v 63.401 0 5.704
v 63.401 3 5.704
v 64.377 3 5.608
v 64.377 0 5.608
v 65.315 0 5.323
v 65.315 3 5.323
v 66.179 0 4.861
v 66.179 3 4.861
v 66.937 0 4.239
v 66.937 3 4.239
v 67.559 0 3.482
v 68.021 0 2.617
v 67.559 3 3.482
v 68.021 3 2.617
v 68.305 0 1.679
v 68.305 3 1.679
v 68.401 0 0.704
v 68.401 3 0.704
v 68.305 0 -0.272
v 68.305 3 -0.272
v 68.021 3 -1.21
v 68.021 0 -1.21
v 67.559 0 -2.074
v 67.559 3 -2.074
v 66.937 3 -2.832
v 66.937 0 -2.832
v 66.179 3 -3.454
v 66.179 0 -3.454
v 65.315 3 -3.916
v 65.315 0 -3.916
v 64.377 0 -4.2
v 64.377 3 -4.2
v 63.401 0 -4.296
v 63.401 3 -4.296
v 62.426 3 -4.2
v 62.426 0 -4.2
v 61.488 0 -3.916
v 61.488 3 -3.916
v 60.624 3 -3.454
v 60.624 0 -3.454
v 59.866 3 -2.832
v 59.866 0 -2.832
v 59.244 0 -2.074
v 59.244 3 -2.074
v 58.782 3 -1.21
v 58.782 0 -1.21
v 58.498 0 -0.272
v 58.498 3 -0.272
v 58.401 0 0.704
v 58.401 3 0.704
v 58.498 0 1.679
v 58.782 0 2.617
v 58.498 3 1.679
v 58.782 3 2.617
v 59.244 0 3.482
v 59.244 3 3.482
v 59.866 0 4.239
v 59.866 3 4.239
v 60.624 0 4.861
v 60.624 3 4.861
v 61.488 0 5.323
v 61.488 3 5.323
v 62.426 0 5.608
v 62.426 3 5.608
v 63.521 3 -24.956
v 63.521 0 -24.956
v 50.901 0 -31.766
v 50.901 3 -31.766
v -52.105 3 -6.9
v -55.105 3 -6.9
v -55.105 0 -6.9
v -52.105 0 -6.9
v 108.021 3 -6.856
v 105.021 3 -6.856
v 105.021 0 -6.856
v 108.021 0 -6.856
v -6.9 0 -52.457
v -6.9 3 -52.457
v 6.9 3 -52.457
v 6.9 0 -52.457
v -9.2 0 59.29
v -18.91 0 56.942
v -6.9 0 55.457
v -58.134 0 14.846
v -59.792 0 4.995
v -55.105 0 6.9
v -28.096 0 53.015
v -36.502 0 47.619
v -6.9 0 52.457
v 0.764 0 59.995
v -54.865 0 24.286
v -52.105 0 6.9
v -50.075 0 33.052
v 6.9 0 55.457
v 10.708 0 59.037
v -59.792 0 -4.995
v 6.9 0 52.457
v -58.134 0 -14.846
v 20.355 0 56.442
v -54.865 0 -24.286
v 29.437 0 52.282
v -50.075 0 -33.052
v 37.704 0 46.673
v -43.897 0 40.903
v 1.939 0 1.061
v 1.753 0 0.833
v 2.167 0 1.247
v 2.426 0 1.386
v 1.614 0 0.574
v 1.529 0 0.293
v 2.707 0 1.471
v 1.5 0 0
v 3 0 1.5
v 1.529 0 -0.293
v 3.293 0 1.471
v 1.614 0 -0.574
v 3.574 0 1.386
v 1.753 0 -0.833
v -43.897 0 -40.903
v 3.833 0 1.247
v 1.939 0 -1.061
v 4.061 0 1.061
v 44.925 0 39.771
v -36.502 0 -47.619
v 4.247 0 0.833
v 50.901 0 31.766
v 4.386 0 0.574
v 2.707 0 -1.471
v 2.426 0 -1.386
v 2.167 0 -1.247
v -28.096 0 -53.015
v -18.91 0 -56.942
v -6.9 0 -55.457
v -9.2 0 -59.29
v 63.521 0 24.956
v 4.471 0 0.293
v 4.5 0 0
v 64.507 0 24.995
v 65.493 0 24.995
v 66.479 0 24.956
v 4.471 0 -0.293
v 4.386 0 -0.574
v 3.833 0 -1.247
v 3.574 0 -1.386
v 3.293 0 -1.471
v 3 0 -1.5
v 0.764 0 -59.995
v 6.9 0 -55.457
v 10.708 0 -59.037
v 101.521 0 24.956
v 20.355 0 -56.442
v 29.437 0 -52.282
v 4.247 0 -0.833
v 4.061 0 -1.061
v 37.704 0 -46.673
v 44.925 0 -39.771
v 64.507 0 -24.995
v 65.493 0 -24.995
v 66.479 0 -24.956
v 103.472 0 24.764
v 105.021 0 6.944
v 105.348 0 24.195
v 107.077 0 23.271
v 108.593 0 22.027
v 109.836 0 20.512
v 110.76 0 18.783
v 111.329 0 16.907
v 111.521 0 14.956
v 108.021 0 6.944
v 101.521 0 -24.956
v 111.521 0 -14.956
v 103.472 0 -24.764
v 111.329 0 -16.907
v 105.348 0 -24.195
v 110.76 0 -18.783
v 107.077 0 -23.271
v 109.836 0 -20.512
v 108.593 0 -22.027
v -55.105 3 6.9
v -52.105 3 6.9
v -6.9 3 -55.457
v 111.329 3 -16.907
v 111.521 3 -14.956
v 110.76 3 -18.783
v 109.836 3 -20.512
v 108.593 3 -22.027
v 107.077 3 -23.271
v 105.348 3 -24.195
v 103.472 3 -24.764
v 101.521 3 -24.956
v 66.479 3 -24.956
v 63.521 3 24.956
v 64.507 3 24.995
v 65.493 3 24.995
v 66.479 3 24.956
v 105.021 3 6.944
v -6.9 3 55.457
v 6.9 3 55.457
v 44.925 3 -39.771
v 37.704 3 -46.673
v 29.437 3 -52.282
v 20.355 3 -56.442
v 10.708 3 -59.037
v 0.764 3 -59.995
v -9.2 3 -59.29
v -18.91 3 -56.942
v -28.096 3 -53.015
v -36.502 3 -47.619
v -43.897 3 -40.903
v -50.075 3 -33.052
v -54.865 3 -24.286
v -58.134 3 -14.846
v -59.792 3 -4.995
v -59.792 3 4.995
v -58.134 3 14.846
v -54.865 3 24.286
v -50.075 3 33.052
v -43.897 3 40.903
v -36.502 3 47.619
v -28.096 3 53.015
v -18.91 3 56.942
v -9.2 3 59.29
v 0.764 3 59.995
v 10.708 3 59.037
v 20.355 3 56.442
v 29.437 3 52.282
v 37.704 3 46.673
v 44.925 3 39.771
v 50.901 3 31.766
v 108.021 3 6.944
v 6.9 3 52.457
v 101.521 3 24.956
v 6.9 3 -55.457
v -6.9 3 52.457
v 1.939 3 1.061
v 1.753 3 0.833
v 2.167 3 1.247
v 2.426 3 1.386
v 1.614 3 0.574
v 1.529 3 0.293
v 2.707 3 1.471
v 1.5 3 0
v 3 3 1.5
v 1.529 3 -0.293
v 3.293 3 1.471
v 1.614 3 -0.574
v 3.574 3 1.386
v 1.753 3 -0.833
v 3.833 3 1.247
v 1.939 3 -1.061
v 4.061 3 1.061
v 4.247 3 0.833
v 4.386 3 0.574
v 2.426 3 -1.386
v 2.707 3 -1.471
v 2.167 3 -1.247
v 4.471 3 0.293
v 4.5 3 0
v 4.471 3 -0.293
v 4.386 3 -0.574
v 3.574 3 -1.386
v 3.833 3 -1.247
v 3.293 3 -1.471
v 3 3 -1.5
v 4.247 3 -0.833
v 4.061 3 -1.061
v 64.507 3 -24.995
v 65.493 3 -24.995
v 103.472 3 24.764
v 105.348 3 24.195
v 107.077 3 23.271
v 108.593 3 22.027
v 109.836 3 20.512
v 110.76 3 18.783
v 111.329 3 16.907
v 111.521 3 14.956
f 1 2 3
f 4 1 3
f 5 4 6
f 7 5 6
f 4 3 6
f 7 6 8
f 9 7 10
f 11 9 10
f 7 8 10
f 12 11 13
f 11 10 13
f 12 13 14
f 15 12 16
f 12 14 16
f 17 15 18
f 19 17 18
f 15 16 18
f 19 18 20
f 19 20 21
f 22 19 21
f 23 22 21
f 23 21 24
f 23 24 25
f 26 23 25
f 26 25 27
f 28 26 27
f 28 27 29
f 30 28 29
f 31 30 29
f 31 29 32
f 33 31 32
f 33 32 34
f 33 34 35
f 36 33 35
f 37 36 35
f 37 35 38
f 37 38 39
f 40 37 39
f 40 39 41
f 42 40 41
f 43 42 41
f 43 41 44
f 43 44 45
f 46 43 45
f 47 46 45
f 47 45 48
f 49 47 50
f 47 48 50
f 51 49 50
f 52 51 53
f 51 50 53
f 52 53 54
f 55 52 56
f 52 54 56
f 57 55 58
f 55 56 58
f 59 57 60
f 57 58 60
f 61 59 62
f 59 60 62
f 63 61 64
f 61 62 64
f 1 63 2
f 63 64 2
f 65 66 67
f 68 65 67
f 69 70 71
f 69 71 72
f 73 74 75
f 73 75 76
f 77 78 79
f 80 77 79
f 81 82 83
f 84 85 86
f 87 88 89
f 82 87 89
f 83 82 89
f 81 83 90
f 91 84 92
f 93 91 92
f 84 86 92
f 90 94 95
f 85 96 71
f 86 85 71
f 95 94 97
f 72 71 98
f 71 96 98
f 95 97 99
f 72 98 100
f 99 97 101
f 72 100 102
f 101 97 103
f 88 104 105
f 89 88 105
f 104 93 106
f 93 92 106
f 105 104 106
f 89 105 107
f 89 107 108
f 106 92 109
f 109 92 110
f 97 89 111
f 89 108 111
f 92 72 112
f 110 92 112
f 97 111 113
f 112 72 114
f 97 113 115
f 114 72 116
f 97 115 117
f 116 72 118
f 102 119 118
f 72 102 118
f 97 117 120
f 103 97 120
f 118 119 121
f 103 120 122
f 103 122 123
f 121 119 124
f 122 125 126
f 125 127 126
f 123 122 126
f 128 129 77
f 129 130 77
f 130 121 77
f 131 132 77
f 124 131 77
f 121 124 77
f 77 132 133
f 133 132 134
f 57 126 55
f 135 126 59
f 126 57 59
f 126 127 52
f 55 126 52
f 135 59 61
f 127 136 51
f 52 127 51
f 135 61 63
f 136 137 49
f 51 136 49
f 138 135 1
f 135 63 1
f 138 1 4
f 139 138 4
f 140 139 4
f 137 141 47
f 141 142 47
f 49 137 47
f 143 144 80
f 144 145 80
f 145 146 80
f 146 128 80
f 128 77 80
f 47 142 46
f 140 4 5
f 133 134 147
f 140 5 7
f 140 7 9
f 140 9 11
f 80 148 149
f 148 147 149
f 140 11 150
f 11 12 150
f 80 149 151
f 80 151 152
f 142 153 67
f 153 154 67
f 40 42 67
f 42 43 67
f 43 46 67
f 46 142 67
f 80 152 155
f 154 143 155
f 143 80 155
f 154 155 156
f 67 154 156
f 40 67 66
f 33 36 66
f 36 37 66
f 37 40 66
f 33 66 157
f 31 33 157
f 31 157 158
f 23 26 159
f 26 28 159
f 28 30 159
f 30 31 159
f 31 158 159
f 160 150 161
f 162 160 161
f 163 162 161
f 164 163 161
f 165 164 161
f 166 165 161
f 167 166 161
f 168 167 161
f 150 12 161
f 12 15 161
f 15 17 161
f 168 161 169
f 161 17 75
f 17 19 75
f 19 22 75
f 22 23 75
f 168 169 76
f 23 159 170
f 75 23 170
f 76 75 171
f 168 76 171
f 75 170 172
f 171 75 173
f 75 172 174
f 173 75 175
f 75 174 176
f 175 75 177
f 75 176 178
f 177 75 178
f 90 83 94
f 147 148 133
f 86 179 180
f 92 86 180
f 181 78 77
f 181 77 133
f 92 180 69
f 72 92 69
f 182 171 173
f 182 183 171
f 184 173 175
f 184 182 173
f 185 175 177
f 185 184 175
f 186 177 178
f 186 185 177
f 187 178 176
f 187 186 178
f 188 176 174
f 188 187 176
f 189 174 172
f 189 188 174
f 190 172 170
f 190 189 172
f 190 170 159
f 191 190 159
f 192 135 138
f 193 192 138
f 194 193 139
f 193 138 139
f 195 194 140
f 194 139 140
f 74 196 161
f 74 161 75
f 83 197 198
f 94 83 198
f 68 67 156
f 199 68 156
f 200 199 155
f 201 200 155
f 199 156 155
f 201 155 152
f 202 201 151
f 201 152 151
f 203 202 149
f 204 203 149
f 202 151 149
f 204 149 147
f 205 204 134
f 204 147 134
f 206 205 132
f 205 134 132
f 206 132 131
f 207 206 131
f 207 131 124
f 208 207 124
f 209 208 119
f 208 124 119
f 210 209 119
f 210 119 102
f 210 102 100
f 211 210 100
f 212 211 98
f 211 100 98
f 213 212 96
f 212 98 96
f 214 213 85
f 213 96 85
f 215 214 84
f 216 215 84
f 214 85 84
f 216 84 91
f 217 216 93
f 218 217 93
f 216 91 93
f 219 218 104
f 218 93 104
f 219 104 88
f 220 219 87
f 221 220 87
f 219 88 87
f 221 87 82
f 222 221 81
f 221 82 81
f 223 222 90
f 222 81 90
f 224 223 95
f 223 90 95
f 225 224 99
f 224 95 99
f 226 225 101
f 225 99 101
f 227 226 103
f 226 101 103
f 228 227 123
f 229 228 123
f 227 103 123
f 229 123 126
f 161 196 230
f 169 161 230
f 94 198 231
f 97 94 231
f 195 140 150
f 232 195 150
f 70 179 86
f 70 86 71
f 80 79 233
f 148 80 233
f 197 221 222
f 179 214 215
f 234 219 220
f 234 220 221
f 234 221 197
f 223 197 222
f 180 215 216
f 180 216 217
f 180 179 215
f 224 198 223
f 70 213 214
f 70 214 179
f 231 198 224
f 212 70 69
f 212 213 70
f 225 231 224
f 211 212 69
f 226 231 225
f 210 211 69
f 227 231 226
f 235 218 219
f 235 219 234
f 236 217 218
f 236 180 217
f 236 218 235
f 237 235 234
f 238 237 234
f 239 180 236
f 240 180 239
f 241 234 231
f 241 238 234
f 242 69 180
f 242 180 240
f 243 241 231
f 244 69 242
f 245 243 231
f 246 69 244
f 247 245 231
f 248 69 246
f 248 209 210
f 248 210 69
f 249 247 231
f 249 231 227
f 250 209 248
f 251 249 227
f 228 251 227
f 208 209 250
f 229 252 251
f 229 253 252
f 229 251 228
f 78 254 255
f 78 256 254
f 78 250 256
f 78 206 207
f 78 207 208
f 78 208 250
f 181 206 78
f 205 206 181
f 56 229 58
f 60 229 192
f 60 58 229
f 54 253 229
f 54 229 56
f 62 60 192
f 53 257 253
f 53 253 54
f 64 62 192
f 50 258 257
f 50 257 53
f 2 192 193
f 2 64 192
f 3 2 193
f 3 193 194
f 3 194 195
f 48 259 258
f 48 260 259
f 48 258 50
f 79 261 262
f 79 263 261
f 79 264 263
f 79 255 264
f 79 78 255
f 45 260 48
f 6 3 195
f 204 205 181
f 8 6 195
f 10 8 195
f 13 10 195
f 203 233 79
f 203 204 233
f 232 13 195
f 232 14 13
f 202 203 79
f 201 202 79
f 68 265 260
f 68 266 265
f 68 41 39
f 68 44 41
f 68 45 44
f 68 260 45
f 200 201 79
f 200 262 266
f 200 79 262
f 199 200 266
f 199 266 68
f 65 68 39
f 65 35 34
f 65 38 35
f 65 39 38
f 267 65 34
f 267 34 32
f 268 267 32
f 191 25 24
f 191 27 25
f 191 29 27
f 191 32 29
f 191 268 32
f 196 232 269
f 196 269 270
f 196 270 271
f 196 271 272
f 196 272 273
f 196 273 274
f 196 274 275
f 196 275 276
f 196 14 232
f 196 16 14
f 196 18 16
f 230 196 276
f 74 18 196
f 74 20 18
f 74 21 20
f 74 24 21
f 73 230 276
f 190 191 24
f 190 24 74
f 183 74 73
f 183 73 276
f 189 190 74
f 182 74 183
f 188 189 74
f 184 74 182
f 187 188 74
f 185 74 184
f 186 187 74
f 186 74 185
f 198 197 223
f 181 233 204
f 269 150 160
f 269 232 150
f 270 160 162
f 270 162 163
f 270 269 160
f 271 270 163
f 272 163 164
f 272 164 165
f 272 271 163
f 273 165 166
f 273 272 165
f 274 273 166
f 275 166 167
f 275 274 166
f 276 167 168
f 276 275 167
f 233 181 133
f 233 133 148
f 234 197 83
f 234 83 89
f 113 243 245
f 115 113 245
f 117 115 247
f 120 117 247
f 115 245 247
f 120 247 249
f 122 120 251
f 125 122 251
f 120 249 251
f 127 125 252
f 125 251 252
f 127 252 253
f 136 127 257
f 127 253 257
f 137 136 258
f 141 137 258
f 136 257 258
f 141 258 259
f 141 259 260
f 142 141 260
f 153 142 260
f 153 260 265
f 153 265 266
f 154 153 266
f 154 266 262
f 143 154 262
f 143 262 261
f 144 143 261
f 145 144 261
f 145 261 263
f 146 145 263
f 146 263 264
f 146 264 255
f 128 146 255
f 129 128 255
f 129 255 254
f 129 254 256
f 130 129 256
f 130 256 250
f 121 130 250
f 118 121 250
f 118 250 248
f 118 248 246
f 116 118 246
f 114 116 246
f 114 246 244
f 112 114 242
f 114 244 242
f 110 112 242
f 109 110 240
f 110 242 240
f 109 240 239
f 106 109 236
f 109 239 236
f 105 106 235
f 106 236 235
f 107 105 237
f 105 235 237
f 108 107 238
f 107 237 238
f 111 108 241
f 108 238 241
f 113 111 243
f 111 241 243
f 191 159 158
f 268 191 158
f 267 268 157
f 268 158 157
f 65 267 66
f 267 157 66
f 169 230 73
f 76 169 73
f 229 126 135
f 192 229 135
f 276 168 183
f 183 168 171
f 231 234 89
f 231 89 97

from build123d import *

# Parameters (mm, degrees)
EXTRUDE_1_DEPTH     = 3
SKETCH_3_W          = 13.8
SKETCH_3_H          = 3
SKETCH_3_W_2        = 3
SKETCH_3_H_2        = 13.8
CUT_EXTRUDE_1_DEPTH = 10
EXTRUDE_START       = -3
EXTRUDE_2_DEPTH     = 3
FILLET_1_R          = 10
SKETCH_6_W          = 3
SKETCH_6_H          = 13.8
CUT_EXTRUDE_2_DEPTH = 10
SKETCH_7_R          = 1.5
CUT_EXTRUDE_3_DEPTH = 10
SKETCH_8_R          = 5
CUT_EXTRUDE_4_DEPTH = 10


with BuildPart() as part:
    # Эскиз2 → Бобышка-Вытянуть1 (new body)
    with BuildSketch(Plane(origin=(0, 0, 0), x_dir=(1, 0, 0), z_dir=(0, 1, 0))):
        with BuildLine():
            Line((50.901300831, -31.765666587), (63.52144012, -24.956238913))
            ThreePointArc((63.52144012, -24.956238913), (90, 0), (63.52144012, 24.956238913))
            Line((63.52144012, 24.956238913), (50.901300831, 31.765666587))
            ThreePointArc((50.901300831, 31.765666587), (-60, 0), (50.901300831, -31.765666587))
        make_face()
    extrude(amount=EXTRUDE_1_DEPTH)

    # Эскиз3 → Вырез-Вытянуть1 (cut)
    with BuildSketch(Plane(origin=(0, 3, 0), x_dir=(1, 0, 0), z_dir=(0, 1, 0))):
        with Locations((0, 53.956851754)):
            Rectangle(SKETCH_3_W, SKETCH_3_H)
        with Locations((0, -53.956851754)):
            Rectangle(SKETCH_3_W, SKETCH_3_H)
        with Locations((-53.60522772, 0)):
            Rectangle(SKETCH_3_W_2, SKETCH_3_H_2)
    extrude(amount=-CUT_EXTRUDE_1_DEPTH, mode=Mode.SUBTRACT)

    # Эскиз5 → Бобышка-Вытянуть2 (add)
    with BuildSketch(Plane(origin=(0, 3, 0), x_dir=(1, 0, 0), z_dir=(0, 1, 0)).offset(EXTRUDE_START)):
        with BuildLine():
            Line((111.52144012, 24.956238913), (66.47855988, 24.956238913))
            ThreePointArc((66.47855988, 24.956238913), (90, 0), (66.47855988, -24.956238913))
            Line((66.47855988, -24.956238913), (111.52144012, -24.956238913))
            Line((111.52144012, -24.956238913), (111.52144012, 24.956238913))
        make_face()
    extrude(amount=EXTRUDE_2_DEPTH)

    # Скругление1
    fillet_1_edges = [part.edges().sort_by_distance(p)[0] for p in [
        (111.52144012, 1.5, 24.956238913),
        (111.52144012, 1.5, -24.956238913),
    ]]
    fillet(fillet_1_edges, radius=FILLET_1_R)

    # Эскиз6 → Вырез-Вытянуть2 (cut)
    with BuildSketch(Plane(origin=(0, 3, 0), x_dir=(1, 0, 0), z_dir=(0, 1, 0))):
        with Locations((106.52144012, -0.043761087)):
            Rectangle(SKETCH_6_W, SKETCH_6_H)
    extrude(amount=-CUT_EXTRUDE_2_DEPTH, mode=Mode.SUBTRACT)

    # Эскиз7 → Вырез-Вытянуть3 (cut)
    with BuildSketch(Plane(origin=(0, 3, 0), x_dir=(1, 0, 0), z_dir=(0, 1, 0))):
        with Locations(Location((3, 0, 0), (0, 0, 270))):
            Circle(SKETCH_7_R)
    extrude(amount=-CUT_EXTRUDE_3_DEPTH, mode=Mode.SUBTRACT)

    # Эскиз8 → Вырез-Вытянуть4 (cut)
    with BuildSketch(Plane(origin=(0, 3, 0), x_dir=(1, 0, 0), z_dir=(0, 1, 0))):
        with Locations(Location((63.40144012, -0.703761087, 0), (0, 0, 270))):
            Circle(SKETCH_8_R)
    extrude(amount=-CUT_EXTRUDE_4_DEPTH, mode=Mode.SUBTRACT)


solid = part.part
